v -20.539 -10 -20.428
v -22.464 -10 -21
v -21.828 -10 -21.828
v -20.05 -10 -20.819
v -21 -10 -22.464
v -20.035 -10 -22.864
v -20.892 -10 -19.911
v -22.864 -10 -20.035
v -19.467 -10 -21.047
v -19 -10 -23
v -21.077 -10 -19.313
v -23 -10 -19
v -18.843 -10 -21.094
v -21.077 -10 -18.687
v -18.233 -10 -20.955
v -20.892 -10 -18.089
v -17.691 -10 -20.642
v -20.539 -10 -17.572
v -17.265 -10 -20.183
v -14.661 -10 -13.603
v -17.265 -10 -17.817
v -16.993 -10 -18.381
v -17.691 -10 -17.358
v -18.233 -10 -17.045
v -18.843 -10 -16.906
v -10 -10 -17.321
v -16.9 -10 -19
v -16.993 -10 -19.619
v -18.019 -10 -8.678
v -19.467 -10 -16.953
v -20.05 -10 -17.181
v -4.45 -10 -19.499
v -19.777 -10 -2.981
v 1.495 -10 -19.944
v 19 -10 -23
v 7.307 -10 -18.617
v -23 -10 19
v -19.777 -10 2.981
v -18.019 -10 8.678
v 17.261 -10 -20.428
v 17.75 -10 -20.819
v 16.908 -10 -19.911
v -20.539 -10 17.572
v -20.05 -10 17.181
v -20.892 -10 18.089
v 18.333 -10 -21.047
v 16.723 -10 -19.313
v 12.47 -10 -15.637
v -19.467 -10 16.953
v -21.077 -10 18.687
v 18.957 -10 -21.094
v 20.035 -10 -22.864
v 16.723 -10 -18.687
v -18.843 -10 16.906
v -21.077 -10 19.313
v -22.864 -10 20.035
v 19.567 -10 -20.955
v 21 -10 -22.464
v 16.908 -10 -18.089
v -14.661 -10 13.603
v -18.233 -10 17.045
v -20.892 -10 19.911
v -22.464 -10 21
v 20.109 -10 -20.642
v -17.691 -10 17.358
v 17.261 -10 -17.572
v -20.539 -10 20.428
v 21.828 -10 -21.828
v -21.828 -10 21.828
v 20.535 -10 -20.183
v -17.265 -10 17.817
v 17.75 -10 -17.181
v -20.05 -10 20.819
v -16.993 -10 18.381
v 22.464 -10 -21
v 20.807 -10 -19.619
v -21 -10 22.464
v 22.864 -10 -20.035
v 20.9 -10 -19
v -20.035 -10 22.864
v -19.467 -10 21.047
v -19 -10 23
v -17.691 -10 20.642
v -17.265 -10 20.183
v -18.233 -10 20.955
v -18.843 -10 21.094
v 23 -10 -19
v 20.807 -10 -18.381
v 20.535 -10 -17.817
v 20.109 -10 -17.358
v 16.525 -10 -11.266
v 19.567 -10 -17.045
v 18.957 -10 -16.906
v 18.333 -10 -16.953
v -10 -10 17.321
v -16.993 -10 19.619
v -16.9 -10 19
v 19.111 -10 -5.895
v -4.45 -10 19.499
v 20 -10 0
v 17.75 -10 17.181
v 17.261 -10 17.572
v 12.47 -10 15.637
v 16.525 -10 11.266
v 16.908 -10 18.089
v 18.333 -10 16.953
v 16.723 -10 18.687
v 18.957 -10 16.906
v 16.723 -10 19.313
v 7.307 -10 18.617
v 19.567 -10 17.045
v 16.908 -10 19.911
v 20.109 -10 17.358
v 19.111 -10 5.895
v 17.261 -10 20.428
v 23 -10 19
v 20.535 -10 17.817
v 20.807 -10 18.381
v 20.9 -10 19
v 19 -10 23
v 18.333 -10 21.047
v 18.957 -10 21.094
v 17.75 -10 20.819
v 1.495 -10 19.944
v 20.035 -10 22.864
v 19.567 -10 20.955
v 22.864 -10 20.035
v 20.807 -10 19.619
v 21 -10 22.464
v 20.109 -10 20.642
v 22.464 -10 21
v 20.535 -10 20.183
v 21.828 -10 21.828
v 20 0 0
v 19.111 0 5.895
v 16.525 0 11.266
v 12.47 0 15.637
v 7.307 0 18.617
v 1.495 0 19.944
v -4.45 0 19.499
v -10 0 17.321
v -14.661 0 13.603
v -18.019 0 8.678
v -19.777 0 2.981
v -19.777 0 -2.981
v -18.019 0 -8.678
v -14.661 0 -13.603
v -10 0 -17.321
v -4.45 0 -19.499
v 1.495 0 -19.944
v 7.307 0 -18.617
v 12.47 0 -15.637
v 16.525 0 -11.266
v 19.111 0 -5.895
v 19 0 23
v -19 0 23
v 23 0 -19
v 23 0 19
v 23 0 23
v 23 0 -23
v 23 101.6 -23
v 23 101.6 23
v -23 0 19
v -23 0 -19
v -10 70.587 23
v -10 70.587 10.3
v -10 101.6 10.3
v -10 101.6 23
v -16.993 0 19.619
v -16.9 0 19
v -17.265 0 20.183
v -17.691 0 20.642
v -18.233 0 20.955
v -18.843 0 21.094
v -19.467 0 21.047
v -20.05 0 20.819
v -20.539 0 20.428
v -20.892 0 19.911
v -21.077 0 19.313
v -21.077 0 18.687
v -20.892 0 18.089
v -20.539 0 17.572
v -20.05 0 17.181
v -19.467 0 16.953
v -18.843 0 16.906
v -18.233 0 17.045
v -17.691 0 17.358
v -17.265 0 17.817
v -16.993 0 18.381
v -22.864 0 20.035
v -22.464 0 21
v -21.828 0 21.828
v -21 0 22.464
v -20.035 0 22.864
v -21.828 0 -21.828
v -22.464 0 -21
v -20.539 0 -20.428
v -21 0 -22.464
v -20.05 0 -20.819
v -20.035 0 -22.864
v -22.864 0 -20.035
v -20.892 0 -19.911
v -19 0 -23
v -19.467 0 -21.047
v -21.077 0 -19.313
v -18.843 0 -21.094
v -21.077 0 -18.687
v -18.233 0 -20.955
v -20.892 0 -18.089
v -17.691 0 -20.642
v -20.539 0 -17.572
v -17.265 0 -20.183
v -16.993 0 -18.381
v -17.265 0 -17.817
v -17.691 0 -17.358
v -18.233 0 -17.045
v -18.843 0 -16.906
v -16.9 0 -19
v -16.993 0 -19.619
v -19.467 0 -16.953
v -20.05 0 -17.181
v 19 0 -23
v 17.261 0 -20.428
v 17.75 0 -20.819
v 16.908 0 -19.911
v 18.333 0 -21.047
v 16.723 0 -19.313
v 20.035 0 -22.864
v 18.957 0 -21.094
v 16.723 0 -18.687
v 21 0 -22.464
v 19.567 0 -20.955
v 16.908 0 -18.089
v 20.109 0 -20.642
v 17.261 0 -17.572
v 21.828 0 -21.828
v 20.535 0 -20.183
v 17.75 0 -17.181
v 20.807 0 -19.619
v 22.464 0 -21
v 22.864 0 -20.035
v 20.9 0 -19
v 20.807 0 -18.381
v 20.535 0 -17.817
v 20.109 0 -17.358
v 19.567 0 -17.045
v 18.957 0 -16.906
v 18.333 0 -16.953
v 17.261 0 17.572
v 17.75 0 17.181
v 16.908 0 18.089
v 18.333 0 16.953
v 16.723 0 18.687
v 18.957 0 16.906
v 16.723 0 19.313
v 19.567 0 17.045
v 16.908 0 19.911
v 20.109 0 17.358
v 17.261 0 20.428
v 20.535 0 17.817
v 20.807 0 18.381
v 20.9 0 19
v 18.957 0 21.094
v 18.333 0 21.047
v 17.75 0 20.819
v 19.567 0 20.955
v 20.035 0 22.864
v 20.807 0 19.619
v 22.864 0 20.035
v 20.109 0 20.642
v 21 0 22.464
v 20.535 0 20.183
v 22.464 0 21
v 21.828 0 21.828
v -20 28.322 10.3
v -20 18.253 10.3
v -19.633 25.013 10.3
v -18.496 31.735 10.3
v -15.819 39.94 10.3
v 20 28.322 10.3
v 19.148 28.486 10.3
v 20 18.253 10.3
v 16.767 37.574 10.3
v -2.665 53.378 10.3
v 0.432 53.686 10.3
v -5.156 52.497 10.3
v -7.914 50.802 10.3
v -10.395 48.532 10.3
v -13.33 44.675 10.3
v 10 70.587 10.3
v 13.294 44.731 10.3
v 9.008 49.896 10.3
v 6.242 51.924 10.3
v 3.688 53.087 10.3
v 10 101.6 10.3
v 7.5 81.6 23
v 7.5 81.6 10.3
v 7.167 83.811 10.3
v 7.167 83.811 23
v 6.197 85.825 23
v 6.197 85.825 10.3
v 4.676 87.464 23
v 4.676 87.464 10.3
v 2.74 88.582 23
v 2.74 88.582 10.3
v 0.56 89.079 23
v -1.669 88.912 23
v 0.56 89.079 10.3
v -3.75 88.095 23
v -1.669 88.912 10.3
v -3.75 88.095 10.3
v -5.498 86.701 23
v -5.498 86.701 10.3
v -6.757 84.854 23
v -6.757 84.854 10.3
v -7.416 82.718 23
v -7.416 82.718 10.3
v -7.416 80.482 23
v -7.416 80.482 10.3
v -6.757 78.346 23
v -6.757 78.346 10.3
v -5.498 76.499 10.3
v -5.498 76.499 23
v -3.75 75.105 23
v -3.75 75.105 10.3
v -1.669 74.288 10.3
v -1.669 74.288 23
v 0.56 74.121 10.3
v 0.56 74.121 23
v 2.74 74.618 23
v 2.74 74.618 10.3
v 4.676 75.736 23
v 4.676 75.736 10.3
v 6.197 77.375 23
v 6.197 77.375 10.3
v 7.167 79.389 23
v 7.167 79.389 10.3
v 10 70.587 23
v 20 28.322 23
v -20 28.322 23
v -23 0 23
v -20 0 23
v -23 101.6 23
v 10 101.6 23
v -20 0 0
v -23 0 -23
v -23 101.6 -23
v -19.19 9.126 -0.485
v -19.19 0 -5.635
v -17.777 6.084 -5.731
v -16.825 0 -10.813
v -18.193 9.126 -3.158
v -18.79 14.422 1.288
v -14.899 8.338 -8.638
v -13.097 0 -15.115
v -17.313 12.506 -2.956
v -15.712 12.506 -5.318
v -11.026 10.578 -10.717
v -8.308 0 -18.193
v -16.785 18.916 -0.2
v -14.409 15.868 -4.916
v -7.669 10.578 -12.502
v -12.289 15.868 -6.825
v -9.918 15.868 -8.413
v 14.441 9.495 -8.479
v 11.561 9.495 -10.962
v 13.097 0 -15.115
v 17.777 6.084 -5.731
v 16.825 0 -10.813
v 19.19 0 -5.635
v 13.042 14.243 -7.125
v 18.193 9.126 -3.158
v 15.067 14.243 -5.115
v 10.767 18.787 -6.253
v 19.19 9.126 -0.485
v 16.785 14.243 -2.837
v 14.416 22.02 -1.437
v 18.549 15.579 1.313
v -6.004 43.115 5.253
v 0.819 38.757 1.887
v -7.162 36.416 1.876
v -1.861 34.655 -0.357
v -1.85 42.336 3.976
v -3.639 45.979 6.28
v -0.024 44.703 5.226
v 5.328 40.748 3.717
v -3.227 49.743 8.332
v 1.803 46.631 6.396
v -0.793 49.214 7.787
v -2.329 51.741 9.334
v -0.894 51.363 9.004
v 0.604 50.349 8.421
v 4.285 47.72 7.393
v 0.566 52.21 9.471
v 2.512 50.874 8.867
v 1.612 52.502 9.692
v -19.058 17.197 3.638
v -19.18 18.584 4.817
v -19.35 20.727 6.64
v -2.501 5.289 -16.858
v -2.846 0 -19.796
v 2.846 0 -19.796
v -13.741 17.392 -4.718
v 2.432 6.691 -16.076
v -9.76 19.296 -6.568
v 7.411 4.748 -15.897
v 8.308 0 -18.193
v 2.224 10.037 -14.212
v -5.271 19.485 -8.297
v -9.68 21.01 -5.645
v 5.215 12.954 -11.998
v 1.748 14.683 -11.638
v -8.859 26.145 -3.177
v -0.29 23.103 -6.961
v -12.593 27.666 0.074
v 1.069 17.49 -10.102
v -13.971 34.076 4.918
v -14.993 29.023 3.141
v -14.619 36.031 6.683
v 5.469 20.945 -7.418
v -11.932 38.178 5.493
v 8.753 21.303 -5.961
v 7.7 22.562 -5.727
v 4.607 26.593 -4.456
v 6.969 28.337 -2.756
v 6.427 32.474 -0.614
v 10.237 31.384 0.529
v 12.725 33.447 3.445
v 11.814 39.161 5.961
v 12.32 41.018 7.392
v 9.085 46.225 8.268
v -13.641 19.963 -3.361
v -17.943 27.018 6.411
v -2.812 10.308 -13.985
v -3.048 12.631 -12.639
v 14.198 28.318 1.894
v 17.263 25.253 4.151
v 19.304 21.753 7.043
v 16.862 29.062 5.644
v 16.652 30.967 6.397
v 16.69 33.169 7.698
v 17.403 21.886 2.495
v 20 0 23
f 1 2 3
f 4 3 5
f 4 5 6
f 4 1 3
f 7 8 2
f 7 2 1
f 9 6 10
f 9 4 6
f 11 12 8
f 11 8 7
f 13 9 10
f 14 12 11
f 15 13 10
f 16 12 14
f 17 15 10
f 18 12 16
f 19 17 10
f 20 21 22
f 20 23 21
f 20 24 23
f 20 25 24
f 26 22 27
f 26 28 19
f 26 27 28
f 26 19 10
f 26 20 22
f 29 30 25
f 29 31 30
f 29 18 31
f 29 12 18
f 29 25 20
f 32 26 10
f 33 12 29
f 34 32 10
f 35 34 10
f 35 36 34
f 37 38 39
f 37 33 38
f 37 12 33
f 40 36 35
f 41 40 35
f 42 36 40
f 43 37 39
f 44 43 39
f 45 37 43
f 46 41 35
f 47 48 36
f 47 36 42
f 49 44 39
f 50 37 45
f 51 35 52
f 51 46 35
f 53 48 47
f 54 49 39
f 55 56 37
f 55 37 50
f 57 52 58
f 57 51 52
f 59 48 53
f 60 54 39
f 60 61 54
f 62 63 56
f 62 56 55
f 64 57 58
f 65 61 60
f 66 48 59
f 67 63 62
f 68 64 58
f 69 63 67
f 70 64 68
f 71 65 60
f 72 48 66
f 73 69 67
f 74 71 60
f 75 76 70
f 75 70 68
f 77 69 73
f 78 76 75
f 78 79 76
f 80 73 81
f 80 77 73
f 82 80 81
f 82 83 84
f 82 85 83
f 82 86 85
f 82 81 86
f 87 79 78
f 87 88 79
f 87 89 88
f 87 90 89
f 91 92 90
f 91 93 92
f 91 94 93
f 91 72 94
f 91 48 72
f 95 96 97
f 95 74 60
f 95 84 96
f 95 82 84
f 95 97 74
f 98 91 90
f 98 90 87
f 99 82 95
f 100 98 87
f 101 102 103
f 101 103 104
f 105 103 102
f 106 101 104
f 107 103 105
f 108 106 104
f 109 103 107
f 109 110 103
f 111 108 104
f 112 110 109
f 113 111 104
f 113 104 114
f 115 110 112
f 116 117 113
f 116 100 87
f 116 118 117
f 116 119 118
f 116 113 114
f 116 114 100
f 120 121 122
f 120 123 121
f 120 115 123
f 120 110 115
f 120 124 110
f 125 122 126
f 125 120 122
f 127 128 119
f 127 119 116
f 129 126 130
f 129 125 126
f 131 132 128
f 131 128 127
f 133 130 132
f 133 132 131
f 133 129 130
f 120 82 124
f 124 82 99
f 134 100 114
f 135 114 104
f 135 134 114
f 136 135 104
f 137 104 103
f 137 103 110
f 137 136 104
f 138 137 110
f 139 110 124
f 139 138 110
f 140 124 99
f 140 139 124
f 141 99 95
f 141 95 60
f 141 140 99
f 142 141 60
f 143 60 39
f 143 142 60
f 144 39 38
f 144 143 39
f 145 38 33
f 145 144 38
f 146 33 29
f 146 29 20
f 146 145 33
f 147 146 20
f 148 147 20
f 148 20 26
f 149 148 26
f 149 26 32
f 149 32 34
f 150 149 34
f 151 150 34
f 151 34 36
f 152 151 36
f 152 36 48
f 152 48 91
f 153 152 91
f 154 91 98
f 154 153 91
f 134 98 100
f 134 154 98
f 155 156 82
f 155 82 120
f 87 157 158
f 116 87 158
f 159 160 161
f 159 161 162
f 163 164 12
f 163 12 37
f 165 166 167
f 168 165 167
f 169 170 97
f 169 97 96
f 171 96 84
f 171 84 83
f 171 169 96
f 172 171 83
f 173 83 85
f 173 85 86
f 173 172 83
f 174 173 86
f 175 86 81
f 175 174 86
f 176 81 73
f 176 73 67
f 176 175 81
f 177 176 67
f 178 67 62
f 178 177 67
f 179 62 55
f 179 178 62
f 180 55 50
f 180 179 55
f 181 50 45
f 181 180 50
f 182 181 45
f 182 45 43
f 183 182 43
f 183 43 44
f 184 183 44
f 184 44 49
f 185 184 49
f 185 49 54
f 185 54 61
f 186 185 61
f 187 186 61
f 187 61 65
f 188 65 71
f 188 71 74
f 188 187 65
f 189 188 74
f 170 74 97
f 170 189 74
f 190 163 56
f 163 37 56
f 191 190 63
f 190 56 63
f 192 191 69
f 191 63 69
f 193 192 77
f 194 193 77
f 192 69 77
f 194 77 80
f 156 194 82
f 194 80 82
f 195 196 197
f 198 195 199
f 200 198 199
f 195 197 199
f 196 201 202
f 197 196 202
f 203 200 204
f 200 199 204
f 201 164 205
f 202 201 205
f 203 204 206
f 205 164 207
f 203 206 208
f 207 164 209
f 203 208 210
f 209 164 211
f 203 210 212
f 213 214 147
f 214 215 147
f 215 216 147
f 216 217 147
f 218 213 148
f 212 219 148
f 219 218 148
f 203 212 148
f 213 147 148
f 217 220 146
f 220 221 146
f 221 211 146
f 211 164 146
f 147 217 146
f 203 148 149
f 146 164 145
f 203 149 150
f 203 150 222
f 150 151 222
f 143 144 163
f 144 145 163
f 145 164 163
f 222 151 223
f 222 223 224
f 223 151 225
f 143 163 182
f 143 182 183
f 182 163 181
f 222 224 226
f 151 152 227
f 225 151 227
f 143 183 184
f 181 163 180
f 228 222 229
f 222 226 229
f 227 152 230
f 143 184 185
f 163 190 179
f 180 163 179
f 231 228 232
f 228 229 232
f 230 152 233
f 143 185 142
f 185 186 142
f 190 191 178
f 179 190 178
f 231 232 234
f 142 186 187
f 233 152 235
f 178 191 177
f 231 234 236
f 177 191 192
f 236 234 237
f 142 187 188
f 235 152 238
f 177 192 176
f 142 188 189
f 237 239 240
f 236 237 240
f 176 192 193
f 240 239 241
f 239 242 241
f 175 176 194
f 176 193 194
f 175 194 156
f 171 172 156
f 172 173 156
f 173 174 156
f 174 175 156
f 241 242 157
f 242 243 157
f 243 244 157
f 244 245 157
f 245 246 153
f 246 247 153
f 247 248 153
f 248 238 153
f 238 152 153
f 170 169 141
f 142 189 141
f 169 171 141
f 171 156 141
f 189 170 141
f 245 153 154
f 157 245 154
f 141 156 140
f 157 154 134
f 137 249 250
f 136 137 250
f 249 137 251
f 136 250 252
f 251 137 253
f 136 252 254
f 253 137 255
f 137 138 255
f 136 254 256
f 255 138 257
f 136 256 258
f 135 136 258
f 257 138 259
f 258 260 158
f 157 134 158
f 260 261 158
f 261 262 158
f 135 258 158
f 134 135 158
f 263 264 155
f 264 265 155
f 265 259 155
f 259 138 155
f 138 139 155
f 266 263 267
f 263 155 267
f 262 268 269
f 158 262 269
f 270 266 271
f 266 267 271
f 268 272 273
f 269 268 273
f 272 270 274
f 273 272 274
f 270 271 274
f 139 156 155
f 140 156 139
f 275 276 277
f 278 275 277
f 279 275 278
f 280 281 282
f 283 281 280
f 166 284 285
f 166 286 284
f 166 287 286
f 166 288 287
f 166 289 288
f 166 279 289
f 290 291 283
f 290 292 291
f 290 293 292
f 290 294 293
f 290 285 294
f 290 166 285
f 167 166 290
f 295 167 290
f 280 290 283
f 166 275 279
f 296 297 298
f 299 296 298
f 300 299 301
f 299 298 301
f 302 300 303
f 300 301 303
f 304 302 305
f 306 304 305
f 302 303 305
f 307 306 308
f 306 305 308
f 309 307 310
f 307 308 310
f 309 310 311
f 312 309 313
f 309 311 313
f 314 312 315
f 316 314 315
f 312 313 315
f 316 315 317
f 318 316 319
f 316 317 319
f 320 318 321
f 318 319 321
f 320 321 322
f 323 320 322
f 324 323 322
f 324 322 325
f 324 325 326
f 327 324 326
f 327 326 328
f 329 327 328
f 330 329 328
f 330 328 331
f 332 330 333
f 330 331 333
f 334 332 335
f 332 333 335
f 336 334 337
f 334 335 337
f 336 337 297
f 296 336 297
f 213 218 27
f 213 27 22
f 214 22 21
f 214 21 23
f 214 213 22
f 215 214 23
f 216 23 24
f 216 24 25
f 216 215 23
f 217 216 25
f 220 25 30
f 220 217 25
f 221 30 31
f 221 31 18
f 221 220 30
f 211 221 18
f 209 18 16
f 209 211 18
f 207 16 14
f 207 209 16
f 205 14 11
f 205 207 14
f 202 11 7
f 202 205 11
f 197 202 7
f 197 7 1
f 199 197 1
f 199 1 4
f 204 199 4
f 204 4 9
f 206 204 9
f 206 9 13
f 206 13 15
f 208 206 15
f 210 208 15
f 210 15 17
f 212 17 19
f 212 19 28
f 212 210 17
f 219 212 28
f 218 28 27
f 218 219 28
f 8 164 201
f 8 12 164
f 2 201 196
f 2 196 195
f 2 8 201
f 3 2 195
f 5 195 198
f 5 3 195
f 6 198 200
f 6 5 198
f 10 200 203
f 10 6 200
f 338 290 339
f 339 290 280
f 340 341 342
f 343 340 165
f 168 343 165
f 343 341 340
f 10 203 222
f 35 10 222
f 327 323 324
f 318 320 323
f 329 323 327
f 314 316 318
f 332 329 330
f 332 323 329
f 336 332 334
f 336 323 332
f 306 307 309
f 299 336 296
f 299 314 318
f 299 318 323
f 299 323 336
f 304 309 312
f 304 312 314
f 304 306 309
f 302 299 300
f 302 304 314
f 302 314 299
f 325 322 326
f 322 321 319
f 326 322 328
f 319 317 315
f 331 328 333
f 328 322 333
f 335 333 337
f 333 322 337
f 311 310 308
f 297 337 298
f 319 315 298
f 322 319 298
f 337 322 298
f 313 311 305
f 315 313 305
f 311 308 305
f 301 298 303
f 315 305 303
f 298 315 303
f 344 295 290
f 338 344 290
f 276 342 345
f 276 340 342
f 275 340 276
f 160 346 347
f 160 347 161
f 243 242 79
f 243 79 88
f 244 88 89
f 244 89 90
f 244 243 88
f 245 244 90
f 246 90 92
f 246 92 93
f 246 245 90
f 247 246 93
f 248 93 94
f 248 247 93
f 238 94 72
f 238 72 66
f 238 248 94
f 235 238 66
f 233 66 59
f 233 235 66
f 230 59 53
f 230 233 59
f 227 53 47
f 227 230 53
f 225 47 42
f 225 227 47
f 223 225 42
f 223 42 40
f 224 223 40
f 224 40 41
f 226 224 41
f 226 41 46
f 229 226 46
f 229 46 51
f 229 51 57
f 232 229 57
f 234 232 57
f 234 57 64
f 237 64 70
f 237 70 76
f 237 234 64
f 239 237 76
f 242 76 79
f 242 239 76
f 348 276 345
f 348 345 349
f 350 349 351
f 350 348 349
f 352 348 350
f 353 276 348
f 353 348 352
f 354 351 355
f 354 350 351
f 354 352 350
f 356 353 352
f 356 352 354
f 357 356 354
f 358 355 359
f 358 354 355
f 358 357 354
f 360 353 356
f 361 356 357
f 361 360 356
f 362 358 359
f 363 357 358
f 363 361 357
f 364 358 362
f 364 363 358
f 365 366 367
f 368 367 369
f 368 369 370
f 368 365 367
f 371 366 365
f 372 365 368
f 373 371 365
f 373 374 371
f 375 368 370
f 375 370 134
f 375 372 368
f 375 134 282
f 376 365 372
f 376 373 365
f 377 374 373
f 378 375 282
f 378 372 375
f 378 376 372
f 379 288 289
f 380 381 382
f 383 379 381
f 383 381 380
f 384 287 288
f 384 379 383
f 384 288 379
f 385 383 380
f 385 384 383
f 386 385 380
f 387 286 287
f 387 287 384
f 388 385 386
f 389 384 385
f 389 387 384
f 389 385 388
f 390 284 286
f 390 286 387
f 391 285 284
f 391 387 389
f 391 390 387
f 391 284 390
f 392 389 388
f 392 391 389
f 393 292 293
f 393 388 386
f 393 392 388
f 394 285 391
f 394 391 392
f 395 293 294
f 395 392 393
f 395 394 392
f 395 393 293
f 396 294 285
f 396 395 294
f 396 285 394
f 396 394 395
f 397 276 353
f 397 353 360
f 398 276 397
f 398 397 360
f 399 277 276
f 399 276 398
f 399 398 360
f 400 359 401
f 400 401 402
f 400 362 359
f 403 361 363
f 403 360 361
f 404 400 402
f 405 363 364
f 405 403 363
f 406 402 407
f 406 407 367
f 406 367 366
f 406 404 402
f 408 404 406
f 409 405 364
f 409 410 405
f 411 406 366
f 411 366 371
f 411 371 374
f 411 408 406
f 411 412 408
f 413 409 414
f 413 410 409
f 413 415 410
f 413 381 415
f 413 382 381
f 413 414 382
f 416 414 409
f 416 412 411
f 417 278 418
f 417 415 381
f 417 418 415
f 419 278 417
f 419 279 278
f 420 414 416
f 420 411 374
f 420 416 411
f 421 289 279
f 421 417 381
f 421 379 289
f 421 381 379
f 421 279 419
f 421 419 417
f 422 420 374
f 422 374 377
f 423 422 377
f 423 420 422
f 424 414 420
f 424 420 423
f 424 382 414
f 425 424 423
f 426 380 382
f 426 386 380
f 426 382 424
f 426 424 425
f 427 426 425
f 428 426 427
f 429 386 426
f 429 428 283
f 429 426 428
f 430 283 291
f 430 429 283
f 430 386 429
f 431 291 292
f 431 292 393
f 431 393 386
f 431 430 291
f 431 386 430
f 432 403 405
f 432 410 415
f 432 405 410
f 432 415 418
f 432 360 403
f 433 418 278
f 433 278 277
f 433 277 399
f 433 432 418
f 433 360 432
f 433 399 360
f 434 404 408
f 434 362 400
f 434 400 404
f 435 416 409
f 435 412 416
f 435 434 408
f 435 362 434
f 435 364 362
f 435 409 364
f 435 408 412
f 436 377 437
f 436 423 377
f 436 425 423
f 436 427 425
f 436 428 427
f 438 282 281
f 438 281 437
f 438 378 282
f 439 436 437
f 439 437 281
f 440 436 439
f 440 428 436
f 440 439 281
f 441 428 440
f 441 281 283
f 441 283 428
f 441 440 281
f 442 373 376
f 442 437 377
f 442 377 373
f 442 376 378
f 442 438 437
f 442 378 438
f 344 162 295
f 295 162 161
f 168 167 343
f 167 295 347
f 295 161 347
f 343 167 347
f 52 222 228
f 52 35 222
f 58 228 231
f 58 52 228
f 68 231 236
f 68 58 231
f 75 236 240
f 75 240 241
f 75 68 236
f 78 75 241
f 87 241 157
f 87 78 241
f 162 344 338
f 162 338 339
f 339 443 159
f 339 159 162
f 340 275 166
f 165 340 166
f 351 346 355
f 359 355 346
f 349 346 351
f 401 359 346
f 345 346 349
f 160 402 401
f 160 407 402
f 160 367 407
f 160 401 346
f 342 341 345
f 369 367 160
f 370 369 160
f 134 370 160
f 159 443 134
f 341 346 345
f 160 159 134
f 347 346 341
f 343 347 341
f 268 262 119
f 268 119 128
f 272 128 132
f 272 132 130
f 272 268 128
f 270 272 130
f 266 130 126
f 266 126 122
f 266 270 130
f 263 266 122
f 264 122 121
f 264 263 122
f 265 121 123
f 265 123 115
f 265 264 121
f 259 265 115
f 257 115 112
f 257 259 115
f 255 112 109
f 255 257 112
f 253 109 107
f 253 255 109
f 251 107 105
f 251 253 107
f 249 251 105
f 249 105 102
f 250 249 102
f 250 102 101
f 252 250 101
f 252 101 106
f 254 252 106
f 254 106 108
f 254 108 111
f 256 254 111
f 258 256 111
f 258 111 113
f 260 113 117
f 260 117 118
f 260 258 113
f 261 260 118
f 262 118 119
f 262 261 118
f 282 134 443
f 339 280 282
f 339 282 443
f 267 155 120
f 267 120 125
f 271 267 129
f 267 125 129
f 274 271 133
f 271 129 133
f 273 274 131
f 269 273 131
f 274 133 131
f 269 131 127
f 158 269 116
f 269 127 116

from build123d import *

# Parameters (mm, degrees)
F0_W      = 46
F0_H      = 46
F1_DEPTH  = 101.6
F5_W      = 40
F5_H      = 101.6
F6_DEPTH  = 12.7
F7_W      = 46
F7_H      = 46
F7_R      = 2.1
F7_R_2    = 20
F8_DEPTH  = 10
F9_R      = 4
F10_R     = 7.5
F11_DEPTH = 12.7
F13_DEPTH = 12.7


with BuildPart() as f1:
    # F0 (on Front) → F1 (new body)
    with BuildSketch(Plane.XZ):
        Rectangle(F0_W, F0_H)
    extrude(amount=-F1_DEPTH)

    # F4: sweep along a path in F3
    with BuildLine(Plane.YZ) as f4_path:
        Line((0, -20), (76.2, 23))
    # F2 (on face) → F4 (sweep, cut)
    with BuildSketch(Plane.XZ):
        with BuildLine():
            Line((-20, 23), (-20, 0))
            ThreePointArc((-20, 0), (0, -20), (20, 0))
            Line((20, 0), (20, 23))
            Line((20, 23), (-20, 23))
        make_face()
    sweep(path=f4_path.line, mode=Mode.SUBTRACT)

    # F5 (on face) → F6 (cut)
    with BuildSketch(Plane.XY.offset(23)):
        with Locations((0, 50.8)):
            Rectangle(F5_W, F5_H)
    extrude(amount=-F6_DEPTH, mode=Mode.SUBTRACT)

    # F12 (on face) → F13 (join)
    with BuildSketch(Plane.XY.offset(10.3)):
        Polygon((-20, 101.6), (-20, 28.322322), (-10, 70.58686), (-10, 101.6), align=None)
        Polygon((10, 70.58686), (20, 28.322322), (20, 101.6), (10, 101.6), align=None)
    extrude(amount=F13_DEPTH)


with BuildPart() as f8:
    # F7 (on face) → F8 (new body)
    with BuildSketch(Plane.XZ):
        Rectangle(F7_W, F7_H)
        with Locations((-19, -19)):
            Circle(F7_R, mode=Mode.SUBTRACT)
        with Locations((18.8, -19)):
            Circle(F7_R, mode=Mode.SUBTRACT)
        with Locations((-19, 19)):
            Circle(F7_R, mode=Mode.SUBTRACT)
        Circle(F7_R_2, mode=Mode.SUBTRACT)
        with Locations((18.8, 19)):
            Circle(F7_R, mode=Mode.SUBTRACT)
    extrude(amount=F8_DEPTH)

    # F9
    f9_edges = [f8.edges().sort_by_distance(p)[0] for p in [
        (23, -5, 23),
        (-23, -5, 23),
        (-23, -5, -23),
        (23, -5, -23),
    ]]
    fillet(f9_edges, radius=F9_R)


with BuildPart() as f11:
    # F10 (on face) → F11 (new body)
    with BuildSketch(Plane.XY.offset(10.3)):
        with Locations((0, 81.6)):
            Circle(F10_R)
    extrude(amount=F11_DEPTH)


solid = Compound([f1.part, f8.part, f11.part])
